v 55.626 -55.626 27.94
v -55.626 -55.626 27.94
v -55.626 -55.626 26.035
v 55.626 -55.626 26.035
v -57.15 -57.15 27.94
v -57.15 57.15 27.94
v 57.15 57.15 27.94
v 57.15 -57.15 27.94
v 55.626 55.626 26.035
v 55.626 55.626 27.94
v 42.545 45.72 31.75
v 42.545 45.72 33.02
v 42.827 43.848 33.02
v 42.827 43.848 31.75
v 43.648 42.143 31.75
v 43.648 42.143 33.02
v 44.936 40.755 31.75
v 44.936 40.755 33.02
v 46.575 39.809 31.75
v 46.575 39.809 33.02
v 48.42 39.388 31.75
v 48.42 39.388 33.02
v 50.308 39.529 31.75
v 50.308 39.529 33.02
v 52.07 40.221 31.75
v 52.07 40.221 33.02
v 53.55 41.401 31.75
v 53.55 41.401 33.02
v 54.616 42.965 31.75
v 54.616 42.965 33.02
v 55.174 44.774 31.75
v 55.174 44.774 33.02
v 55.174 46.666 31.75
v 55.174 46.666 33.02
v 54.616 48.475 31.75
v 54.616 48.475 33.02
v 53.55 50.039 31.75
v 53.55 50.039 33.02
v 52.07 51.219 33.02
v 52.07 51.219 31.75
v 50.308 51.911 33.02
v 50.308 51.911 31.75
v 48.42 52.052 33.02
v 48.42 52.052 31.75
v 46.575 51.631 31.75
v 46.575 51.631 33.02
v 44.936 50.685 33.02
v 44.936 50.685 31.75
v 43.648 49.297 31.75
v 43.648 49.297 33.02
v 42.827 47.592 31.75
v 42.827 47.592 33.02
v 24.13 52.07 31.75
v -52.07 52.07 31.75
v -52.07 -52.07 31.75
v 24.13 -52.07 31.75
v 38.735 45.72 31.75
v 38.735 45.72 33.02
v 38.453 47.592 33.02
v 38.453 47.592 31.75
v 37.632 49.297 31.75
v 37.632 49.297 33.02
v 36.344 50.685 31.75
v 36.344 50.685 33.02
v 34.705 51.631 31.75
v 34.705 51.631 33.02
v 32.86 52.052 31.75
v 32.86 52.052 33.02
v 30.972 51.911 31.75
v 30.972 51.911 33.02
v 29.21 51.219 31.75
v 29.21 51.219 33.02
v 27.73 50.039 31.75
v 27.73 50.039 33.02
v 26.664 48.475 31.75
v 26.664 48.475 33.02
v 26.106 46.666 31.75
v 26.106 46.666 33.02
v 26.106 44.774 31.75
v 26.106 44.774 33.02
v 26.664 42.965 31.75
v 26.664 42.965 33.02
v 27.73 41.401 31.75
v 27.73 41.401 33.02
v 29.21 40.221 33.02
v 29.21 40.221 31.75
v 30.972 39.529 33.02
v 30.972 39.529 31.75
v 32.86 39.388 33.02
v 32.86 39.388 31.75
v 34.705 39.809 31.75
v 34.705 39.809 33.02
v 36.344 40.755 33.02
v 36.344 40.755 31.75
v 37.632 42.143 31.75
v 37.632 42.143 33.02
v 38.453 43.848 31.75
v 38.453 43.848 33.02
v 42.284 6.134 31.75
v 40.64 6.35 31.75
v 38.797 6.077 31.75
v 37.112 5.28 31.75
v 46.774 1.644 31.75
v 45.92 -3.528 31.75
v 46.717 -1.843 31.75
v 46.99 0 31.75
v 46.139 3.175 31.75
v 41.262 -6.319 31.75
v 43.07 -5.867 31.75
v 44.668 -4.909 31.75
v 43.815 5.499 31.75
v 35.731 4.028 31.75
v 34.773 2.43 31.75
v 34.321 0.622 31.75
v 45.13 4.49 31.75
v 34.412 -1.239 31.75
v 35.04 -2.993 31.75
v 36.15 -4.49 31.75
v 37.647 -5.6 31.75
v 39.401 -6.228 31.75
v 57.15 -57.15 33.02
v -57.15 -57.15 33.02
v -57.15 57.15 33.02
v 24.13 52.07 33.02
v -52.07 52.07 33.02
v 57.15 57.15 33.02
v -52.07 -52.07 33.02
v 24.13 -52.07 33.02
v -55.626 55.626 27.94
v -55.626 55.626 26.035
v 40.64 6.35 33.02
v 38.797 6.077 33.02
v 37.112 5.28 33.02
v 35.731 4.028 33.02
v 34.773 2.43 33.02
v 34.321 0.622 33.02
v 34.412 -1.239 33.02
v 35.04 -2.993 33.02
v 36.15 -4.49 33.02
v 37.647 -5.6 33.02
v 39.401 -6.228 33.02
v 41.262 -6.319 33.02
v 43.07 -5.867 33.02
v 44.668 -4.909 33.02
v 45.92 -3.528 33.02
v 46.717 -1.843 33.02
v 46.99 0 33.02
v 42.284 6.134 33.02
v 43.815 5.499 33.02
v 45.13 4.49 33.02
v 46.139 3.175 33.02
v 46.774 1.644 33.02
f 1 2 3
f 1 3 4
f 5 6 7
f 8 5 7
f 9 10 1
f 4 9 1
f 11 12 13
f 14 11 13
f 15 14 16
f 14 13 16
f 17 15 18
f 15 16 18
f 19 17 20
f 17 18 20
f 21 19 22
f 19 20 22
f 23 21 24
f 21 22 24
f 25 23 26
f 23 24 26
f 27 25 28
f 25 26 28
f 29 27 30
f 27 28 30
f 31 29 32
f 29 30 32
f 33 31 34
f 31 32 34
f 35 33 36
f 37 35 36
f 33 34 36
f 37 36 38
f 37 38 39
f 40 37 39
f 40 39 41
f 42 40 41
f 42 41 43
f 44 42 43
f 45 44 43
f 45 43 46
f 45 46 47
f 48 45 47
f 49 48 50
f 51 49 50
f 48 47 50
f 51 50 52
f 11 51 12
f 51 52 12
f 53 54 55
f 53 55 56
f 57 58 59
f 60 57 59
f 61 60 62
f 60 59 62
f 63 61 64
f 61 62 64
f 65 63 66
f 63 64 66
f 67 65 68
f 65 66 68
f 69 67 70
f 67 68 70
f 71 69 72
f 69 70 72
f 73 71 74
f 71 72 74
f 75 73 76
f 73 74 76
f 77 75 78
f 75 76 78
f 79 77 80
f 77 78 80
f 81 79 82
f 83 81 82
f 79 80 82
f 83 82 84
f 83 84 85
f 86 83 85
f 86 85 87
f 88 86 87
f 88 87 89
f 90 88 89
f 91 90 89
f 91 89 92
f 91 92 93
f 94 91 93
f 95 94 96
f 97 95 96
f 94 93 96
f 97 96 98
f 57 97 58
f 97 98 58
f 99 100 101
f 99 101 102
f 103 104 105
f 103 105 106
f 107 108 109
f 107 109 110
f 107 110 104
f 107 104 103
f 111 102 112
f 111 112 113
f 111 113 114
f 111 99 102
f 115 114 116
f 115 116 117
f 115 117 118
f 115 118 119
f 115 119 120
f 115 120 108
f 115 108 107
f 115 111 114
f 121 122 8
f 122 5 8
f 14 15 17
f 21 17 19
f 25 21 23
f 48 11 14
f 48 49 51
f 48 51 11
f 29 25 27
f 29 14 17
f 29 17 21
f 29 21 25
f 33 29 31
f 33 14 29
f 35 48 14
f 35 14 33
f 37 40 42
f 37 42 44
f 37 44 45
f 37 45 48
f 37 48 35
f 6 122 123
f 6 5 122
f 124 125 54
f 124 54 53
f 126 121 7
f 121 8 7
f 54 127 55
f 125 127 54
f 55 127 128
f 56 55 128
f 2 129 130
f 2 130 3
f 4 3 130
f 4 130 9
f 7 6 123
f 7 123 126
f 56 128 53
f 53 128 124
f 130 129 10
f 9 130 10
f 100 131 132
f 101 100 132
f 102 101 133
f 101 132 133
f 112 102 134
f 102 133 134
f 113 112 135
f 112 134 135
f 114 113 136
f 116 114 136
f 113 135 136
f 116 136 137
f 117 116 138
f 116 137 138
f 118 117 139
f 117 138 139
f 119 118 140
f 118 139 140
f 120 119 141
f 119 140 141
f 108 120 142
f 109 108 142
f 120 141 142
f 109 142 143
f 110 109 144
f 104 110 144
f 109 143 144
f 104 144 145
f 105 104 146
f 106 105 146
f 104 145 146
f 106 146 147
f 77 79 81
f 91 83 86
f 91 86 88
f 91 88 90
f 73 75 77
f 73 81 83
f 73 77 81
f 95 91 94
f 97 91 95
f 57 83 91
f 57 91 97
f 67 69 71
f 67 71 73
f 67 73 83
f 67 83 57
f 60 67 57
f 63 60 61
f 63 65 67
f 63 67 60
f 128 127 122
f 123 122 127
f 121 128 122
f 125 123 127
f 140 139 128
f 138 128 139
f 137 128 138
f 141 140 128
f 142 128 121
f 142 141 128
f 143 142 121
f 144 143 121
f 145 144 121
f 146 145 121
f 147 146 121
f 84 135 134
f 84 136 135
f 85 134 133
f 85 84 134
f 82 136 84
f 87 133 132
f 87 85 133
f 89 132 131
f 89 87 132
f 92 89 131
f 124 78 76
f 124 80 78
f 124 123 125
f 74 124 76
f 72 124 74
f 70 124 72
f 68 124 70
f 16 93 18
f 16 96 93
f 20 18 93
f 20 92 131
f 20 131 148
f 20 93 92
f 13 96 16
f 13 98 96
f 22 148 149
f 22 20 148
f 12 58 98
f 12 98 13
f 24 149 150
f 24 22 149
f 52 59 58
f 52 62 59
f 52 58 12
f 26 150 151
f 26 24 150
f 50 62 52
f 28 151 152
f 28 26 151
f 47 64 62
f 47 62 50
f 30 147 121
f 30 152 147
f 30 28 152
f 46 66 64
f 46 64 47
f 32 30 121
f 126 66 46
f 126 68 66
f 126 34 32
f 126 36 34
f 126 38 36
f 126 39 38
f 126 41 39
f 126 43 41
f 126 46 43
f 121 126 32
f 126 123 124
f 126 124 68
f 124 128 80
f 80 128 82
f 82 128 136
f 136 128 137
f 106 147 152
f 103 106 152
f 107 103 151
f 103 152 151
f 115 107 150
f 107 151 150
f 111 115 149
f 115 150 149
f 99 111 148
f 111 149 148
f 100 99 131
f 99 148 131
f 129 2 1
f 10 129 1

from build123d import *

# Parameters (mm, degrees)
F0_W      = 114.3
F0_H      = 114.3
F1_DEPTH  = 2.54
F2_W      = 114.3
F2_H      = 25.4
F3_DEPTH  = 2.54
F5_W      = 109.22
F5_H      = 25.4
F6_DEPTH  = 2.54
F8_W      = 114.3
F8_H      = 114.3
F8_W_2    = 109.22
F8_H_2    = 109.22
F9_DEPTH  = 2.54
F10_W     = 114.3
F10_H     = 114.3
F11_DEPTH = 2.54
F12_W     = 76.2
F12_H     = 104.14
F13_DEPTH = 1.27
F14_R     = 6.35
F15_DEPTH = 1.27
F17_W     = 111.252
F17_H     = 111.252
F18_DEPTH = 1.905


with BuildPart() as f1:
    # F0 (on Top) → F1 (new body)
    with BuildSketch(Plane.XY):
        Rectangle(F0_W, F0_H)
    extrude(amount=F1_DEPTH)

    # F4: F3 across plane


with BuildPart() as f3:
    # F2 (on face) → F3 (new body)
    with BuildSketch(Plane.YZ.offset(57.15)):
        with Locations((0, 15.24)):
            Rectangle(F2_W, F2_H)
    extrude(amount=-F3_DEPTH)


with BuildPart() as f1_1:
    add(f1.part)
    add(f3.part.mirror(Plane.YZ))


    add(f3.part)  # F6 merges F3
    # F5 (on face) → F6 (join)
    with BuildSketch(Plane(origin=(0, 57.15, 0), x_dir=(-1, 0, 0), z_dir=(0, 1, 0))):
        with Locations((0, 15.24)):
            Rectangle(F5_W, F5_H)
    extrude(amount=-F6_DEPTH)

    # F7: F1 across plane


with BuildPart() as f1_2:
    add(f1_1.part)
    add(f1_1.part.mirror(Plane.XZ))


with BuildPart() as f9:
    # F8 (on face) → F9 (new body)
    with BuildSketch(Plane.XY.offset(27.94)):
        Rectangle(F8_W, F8_H)
        Rectangle(F8_W_2, F8_H_2, mode=Mode.SUBTRACT)
        Rectangle(F8_W_2, F8_H_2)
    extrude(amount=F9_DEPTH)

    # F10 (on face) → F11 (join)
    with BuildSketch(Plane.XY.offset(30.48)):
        Rectangle(F10_W, F10_H)
    extrude(amount=F11_DEPTH)

    # F12 (on face) → F13 (cut)
    with BuildSketch(Plane.XY.offset(33.02)):
        with Locations((-13.97, 0)):
            Rectangle(F12_W, F12_H)
    extrude(amount=-F13_DEPTH, mode=Mode.SUBTRACT)

    # F14 (on face) → F15 (cut)
    with BuildSketch(Plane.XY.offset(33.02)):
        with BuildLine():
            ThreePointArc((55.245, 45.72), (48.895, 52.07), (42.545, 45.72))
            ThreePointArc((42.545, 45.72), (48.895, 39.37), (55.245, 45.72))
        make_face()
        with Locations((32.385, 45.72)):
            Circle(F14_R)
        with BuildLine():
            ThreePointArc((40.64, 6.35), (36.1498719395, -4.4901280605), (46.99, 0))
            ThreePointArc((46.99, 0), (45.1301280605, 4.4901280605), (40.64, 6.35))
        make_face()
    extrude(amount=-F15_DEPTH, mode=Mode.SUBTRACT)


with BuildPart() as f18:
    # F17 (on face) → F18 (new body)
    with BuildSketch(Plane(origin=(0, 0, 27.94), x_dir=(1, 0, 0), z_dir=(0, 0, -1))):
        Rectangle(F17_W, F17_H)
    extrude(amount=F18_DEPTH)


solid = Compound([f9.part, f18.part])
